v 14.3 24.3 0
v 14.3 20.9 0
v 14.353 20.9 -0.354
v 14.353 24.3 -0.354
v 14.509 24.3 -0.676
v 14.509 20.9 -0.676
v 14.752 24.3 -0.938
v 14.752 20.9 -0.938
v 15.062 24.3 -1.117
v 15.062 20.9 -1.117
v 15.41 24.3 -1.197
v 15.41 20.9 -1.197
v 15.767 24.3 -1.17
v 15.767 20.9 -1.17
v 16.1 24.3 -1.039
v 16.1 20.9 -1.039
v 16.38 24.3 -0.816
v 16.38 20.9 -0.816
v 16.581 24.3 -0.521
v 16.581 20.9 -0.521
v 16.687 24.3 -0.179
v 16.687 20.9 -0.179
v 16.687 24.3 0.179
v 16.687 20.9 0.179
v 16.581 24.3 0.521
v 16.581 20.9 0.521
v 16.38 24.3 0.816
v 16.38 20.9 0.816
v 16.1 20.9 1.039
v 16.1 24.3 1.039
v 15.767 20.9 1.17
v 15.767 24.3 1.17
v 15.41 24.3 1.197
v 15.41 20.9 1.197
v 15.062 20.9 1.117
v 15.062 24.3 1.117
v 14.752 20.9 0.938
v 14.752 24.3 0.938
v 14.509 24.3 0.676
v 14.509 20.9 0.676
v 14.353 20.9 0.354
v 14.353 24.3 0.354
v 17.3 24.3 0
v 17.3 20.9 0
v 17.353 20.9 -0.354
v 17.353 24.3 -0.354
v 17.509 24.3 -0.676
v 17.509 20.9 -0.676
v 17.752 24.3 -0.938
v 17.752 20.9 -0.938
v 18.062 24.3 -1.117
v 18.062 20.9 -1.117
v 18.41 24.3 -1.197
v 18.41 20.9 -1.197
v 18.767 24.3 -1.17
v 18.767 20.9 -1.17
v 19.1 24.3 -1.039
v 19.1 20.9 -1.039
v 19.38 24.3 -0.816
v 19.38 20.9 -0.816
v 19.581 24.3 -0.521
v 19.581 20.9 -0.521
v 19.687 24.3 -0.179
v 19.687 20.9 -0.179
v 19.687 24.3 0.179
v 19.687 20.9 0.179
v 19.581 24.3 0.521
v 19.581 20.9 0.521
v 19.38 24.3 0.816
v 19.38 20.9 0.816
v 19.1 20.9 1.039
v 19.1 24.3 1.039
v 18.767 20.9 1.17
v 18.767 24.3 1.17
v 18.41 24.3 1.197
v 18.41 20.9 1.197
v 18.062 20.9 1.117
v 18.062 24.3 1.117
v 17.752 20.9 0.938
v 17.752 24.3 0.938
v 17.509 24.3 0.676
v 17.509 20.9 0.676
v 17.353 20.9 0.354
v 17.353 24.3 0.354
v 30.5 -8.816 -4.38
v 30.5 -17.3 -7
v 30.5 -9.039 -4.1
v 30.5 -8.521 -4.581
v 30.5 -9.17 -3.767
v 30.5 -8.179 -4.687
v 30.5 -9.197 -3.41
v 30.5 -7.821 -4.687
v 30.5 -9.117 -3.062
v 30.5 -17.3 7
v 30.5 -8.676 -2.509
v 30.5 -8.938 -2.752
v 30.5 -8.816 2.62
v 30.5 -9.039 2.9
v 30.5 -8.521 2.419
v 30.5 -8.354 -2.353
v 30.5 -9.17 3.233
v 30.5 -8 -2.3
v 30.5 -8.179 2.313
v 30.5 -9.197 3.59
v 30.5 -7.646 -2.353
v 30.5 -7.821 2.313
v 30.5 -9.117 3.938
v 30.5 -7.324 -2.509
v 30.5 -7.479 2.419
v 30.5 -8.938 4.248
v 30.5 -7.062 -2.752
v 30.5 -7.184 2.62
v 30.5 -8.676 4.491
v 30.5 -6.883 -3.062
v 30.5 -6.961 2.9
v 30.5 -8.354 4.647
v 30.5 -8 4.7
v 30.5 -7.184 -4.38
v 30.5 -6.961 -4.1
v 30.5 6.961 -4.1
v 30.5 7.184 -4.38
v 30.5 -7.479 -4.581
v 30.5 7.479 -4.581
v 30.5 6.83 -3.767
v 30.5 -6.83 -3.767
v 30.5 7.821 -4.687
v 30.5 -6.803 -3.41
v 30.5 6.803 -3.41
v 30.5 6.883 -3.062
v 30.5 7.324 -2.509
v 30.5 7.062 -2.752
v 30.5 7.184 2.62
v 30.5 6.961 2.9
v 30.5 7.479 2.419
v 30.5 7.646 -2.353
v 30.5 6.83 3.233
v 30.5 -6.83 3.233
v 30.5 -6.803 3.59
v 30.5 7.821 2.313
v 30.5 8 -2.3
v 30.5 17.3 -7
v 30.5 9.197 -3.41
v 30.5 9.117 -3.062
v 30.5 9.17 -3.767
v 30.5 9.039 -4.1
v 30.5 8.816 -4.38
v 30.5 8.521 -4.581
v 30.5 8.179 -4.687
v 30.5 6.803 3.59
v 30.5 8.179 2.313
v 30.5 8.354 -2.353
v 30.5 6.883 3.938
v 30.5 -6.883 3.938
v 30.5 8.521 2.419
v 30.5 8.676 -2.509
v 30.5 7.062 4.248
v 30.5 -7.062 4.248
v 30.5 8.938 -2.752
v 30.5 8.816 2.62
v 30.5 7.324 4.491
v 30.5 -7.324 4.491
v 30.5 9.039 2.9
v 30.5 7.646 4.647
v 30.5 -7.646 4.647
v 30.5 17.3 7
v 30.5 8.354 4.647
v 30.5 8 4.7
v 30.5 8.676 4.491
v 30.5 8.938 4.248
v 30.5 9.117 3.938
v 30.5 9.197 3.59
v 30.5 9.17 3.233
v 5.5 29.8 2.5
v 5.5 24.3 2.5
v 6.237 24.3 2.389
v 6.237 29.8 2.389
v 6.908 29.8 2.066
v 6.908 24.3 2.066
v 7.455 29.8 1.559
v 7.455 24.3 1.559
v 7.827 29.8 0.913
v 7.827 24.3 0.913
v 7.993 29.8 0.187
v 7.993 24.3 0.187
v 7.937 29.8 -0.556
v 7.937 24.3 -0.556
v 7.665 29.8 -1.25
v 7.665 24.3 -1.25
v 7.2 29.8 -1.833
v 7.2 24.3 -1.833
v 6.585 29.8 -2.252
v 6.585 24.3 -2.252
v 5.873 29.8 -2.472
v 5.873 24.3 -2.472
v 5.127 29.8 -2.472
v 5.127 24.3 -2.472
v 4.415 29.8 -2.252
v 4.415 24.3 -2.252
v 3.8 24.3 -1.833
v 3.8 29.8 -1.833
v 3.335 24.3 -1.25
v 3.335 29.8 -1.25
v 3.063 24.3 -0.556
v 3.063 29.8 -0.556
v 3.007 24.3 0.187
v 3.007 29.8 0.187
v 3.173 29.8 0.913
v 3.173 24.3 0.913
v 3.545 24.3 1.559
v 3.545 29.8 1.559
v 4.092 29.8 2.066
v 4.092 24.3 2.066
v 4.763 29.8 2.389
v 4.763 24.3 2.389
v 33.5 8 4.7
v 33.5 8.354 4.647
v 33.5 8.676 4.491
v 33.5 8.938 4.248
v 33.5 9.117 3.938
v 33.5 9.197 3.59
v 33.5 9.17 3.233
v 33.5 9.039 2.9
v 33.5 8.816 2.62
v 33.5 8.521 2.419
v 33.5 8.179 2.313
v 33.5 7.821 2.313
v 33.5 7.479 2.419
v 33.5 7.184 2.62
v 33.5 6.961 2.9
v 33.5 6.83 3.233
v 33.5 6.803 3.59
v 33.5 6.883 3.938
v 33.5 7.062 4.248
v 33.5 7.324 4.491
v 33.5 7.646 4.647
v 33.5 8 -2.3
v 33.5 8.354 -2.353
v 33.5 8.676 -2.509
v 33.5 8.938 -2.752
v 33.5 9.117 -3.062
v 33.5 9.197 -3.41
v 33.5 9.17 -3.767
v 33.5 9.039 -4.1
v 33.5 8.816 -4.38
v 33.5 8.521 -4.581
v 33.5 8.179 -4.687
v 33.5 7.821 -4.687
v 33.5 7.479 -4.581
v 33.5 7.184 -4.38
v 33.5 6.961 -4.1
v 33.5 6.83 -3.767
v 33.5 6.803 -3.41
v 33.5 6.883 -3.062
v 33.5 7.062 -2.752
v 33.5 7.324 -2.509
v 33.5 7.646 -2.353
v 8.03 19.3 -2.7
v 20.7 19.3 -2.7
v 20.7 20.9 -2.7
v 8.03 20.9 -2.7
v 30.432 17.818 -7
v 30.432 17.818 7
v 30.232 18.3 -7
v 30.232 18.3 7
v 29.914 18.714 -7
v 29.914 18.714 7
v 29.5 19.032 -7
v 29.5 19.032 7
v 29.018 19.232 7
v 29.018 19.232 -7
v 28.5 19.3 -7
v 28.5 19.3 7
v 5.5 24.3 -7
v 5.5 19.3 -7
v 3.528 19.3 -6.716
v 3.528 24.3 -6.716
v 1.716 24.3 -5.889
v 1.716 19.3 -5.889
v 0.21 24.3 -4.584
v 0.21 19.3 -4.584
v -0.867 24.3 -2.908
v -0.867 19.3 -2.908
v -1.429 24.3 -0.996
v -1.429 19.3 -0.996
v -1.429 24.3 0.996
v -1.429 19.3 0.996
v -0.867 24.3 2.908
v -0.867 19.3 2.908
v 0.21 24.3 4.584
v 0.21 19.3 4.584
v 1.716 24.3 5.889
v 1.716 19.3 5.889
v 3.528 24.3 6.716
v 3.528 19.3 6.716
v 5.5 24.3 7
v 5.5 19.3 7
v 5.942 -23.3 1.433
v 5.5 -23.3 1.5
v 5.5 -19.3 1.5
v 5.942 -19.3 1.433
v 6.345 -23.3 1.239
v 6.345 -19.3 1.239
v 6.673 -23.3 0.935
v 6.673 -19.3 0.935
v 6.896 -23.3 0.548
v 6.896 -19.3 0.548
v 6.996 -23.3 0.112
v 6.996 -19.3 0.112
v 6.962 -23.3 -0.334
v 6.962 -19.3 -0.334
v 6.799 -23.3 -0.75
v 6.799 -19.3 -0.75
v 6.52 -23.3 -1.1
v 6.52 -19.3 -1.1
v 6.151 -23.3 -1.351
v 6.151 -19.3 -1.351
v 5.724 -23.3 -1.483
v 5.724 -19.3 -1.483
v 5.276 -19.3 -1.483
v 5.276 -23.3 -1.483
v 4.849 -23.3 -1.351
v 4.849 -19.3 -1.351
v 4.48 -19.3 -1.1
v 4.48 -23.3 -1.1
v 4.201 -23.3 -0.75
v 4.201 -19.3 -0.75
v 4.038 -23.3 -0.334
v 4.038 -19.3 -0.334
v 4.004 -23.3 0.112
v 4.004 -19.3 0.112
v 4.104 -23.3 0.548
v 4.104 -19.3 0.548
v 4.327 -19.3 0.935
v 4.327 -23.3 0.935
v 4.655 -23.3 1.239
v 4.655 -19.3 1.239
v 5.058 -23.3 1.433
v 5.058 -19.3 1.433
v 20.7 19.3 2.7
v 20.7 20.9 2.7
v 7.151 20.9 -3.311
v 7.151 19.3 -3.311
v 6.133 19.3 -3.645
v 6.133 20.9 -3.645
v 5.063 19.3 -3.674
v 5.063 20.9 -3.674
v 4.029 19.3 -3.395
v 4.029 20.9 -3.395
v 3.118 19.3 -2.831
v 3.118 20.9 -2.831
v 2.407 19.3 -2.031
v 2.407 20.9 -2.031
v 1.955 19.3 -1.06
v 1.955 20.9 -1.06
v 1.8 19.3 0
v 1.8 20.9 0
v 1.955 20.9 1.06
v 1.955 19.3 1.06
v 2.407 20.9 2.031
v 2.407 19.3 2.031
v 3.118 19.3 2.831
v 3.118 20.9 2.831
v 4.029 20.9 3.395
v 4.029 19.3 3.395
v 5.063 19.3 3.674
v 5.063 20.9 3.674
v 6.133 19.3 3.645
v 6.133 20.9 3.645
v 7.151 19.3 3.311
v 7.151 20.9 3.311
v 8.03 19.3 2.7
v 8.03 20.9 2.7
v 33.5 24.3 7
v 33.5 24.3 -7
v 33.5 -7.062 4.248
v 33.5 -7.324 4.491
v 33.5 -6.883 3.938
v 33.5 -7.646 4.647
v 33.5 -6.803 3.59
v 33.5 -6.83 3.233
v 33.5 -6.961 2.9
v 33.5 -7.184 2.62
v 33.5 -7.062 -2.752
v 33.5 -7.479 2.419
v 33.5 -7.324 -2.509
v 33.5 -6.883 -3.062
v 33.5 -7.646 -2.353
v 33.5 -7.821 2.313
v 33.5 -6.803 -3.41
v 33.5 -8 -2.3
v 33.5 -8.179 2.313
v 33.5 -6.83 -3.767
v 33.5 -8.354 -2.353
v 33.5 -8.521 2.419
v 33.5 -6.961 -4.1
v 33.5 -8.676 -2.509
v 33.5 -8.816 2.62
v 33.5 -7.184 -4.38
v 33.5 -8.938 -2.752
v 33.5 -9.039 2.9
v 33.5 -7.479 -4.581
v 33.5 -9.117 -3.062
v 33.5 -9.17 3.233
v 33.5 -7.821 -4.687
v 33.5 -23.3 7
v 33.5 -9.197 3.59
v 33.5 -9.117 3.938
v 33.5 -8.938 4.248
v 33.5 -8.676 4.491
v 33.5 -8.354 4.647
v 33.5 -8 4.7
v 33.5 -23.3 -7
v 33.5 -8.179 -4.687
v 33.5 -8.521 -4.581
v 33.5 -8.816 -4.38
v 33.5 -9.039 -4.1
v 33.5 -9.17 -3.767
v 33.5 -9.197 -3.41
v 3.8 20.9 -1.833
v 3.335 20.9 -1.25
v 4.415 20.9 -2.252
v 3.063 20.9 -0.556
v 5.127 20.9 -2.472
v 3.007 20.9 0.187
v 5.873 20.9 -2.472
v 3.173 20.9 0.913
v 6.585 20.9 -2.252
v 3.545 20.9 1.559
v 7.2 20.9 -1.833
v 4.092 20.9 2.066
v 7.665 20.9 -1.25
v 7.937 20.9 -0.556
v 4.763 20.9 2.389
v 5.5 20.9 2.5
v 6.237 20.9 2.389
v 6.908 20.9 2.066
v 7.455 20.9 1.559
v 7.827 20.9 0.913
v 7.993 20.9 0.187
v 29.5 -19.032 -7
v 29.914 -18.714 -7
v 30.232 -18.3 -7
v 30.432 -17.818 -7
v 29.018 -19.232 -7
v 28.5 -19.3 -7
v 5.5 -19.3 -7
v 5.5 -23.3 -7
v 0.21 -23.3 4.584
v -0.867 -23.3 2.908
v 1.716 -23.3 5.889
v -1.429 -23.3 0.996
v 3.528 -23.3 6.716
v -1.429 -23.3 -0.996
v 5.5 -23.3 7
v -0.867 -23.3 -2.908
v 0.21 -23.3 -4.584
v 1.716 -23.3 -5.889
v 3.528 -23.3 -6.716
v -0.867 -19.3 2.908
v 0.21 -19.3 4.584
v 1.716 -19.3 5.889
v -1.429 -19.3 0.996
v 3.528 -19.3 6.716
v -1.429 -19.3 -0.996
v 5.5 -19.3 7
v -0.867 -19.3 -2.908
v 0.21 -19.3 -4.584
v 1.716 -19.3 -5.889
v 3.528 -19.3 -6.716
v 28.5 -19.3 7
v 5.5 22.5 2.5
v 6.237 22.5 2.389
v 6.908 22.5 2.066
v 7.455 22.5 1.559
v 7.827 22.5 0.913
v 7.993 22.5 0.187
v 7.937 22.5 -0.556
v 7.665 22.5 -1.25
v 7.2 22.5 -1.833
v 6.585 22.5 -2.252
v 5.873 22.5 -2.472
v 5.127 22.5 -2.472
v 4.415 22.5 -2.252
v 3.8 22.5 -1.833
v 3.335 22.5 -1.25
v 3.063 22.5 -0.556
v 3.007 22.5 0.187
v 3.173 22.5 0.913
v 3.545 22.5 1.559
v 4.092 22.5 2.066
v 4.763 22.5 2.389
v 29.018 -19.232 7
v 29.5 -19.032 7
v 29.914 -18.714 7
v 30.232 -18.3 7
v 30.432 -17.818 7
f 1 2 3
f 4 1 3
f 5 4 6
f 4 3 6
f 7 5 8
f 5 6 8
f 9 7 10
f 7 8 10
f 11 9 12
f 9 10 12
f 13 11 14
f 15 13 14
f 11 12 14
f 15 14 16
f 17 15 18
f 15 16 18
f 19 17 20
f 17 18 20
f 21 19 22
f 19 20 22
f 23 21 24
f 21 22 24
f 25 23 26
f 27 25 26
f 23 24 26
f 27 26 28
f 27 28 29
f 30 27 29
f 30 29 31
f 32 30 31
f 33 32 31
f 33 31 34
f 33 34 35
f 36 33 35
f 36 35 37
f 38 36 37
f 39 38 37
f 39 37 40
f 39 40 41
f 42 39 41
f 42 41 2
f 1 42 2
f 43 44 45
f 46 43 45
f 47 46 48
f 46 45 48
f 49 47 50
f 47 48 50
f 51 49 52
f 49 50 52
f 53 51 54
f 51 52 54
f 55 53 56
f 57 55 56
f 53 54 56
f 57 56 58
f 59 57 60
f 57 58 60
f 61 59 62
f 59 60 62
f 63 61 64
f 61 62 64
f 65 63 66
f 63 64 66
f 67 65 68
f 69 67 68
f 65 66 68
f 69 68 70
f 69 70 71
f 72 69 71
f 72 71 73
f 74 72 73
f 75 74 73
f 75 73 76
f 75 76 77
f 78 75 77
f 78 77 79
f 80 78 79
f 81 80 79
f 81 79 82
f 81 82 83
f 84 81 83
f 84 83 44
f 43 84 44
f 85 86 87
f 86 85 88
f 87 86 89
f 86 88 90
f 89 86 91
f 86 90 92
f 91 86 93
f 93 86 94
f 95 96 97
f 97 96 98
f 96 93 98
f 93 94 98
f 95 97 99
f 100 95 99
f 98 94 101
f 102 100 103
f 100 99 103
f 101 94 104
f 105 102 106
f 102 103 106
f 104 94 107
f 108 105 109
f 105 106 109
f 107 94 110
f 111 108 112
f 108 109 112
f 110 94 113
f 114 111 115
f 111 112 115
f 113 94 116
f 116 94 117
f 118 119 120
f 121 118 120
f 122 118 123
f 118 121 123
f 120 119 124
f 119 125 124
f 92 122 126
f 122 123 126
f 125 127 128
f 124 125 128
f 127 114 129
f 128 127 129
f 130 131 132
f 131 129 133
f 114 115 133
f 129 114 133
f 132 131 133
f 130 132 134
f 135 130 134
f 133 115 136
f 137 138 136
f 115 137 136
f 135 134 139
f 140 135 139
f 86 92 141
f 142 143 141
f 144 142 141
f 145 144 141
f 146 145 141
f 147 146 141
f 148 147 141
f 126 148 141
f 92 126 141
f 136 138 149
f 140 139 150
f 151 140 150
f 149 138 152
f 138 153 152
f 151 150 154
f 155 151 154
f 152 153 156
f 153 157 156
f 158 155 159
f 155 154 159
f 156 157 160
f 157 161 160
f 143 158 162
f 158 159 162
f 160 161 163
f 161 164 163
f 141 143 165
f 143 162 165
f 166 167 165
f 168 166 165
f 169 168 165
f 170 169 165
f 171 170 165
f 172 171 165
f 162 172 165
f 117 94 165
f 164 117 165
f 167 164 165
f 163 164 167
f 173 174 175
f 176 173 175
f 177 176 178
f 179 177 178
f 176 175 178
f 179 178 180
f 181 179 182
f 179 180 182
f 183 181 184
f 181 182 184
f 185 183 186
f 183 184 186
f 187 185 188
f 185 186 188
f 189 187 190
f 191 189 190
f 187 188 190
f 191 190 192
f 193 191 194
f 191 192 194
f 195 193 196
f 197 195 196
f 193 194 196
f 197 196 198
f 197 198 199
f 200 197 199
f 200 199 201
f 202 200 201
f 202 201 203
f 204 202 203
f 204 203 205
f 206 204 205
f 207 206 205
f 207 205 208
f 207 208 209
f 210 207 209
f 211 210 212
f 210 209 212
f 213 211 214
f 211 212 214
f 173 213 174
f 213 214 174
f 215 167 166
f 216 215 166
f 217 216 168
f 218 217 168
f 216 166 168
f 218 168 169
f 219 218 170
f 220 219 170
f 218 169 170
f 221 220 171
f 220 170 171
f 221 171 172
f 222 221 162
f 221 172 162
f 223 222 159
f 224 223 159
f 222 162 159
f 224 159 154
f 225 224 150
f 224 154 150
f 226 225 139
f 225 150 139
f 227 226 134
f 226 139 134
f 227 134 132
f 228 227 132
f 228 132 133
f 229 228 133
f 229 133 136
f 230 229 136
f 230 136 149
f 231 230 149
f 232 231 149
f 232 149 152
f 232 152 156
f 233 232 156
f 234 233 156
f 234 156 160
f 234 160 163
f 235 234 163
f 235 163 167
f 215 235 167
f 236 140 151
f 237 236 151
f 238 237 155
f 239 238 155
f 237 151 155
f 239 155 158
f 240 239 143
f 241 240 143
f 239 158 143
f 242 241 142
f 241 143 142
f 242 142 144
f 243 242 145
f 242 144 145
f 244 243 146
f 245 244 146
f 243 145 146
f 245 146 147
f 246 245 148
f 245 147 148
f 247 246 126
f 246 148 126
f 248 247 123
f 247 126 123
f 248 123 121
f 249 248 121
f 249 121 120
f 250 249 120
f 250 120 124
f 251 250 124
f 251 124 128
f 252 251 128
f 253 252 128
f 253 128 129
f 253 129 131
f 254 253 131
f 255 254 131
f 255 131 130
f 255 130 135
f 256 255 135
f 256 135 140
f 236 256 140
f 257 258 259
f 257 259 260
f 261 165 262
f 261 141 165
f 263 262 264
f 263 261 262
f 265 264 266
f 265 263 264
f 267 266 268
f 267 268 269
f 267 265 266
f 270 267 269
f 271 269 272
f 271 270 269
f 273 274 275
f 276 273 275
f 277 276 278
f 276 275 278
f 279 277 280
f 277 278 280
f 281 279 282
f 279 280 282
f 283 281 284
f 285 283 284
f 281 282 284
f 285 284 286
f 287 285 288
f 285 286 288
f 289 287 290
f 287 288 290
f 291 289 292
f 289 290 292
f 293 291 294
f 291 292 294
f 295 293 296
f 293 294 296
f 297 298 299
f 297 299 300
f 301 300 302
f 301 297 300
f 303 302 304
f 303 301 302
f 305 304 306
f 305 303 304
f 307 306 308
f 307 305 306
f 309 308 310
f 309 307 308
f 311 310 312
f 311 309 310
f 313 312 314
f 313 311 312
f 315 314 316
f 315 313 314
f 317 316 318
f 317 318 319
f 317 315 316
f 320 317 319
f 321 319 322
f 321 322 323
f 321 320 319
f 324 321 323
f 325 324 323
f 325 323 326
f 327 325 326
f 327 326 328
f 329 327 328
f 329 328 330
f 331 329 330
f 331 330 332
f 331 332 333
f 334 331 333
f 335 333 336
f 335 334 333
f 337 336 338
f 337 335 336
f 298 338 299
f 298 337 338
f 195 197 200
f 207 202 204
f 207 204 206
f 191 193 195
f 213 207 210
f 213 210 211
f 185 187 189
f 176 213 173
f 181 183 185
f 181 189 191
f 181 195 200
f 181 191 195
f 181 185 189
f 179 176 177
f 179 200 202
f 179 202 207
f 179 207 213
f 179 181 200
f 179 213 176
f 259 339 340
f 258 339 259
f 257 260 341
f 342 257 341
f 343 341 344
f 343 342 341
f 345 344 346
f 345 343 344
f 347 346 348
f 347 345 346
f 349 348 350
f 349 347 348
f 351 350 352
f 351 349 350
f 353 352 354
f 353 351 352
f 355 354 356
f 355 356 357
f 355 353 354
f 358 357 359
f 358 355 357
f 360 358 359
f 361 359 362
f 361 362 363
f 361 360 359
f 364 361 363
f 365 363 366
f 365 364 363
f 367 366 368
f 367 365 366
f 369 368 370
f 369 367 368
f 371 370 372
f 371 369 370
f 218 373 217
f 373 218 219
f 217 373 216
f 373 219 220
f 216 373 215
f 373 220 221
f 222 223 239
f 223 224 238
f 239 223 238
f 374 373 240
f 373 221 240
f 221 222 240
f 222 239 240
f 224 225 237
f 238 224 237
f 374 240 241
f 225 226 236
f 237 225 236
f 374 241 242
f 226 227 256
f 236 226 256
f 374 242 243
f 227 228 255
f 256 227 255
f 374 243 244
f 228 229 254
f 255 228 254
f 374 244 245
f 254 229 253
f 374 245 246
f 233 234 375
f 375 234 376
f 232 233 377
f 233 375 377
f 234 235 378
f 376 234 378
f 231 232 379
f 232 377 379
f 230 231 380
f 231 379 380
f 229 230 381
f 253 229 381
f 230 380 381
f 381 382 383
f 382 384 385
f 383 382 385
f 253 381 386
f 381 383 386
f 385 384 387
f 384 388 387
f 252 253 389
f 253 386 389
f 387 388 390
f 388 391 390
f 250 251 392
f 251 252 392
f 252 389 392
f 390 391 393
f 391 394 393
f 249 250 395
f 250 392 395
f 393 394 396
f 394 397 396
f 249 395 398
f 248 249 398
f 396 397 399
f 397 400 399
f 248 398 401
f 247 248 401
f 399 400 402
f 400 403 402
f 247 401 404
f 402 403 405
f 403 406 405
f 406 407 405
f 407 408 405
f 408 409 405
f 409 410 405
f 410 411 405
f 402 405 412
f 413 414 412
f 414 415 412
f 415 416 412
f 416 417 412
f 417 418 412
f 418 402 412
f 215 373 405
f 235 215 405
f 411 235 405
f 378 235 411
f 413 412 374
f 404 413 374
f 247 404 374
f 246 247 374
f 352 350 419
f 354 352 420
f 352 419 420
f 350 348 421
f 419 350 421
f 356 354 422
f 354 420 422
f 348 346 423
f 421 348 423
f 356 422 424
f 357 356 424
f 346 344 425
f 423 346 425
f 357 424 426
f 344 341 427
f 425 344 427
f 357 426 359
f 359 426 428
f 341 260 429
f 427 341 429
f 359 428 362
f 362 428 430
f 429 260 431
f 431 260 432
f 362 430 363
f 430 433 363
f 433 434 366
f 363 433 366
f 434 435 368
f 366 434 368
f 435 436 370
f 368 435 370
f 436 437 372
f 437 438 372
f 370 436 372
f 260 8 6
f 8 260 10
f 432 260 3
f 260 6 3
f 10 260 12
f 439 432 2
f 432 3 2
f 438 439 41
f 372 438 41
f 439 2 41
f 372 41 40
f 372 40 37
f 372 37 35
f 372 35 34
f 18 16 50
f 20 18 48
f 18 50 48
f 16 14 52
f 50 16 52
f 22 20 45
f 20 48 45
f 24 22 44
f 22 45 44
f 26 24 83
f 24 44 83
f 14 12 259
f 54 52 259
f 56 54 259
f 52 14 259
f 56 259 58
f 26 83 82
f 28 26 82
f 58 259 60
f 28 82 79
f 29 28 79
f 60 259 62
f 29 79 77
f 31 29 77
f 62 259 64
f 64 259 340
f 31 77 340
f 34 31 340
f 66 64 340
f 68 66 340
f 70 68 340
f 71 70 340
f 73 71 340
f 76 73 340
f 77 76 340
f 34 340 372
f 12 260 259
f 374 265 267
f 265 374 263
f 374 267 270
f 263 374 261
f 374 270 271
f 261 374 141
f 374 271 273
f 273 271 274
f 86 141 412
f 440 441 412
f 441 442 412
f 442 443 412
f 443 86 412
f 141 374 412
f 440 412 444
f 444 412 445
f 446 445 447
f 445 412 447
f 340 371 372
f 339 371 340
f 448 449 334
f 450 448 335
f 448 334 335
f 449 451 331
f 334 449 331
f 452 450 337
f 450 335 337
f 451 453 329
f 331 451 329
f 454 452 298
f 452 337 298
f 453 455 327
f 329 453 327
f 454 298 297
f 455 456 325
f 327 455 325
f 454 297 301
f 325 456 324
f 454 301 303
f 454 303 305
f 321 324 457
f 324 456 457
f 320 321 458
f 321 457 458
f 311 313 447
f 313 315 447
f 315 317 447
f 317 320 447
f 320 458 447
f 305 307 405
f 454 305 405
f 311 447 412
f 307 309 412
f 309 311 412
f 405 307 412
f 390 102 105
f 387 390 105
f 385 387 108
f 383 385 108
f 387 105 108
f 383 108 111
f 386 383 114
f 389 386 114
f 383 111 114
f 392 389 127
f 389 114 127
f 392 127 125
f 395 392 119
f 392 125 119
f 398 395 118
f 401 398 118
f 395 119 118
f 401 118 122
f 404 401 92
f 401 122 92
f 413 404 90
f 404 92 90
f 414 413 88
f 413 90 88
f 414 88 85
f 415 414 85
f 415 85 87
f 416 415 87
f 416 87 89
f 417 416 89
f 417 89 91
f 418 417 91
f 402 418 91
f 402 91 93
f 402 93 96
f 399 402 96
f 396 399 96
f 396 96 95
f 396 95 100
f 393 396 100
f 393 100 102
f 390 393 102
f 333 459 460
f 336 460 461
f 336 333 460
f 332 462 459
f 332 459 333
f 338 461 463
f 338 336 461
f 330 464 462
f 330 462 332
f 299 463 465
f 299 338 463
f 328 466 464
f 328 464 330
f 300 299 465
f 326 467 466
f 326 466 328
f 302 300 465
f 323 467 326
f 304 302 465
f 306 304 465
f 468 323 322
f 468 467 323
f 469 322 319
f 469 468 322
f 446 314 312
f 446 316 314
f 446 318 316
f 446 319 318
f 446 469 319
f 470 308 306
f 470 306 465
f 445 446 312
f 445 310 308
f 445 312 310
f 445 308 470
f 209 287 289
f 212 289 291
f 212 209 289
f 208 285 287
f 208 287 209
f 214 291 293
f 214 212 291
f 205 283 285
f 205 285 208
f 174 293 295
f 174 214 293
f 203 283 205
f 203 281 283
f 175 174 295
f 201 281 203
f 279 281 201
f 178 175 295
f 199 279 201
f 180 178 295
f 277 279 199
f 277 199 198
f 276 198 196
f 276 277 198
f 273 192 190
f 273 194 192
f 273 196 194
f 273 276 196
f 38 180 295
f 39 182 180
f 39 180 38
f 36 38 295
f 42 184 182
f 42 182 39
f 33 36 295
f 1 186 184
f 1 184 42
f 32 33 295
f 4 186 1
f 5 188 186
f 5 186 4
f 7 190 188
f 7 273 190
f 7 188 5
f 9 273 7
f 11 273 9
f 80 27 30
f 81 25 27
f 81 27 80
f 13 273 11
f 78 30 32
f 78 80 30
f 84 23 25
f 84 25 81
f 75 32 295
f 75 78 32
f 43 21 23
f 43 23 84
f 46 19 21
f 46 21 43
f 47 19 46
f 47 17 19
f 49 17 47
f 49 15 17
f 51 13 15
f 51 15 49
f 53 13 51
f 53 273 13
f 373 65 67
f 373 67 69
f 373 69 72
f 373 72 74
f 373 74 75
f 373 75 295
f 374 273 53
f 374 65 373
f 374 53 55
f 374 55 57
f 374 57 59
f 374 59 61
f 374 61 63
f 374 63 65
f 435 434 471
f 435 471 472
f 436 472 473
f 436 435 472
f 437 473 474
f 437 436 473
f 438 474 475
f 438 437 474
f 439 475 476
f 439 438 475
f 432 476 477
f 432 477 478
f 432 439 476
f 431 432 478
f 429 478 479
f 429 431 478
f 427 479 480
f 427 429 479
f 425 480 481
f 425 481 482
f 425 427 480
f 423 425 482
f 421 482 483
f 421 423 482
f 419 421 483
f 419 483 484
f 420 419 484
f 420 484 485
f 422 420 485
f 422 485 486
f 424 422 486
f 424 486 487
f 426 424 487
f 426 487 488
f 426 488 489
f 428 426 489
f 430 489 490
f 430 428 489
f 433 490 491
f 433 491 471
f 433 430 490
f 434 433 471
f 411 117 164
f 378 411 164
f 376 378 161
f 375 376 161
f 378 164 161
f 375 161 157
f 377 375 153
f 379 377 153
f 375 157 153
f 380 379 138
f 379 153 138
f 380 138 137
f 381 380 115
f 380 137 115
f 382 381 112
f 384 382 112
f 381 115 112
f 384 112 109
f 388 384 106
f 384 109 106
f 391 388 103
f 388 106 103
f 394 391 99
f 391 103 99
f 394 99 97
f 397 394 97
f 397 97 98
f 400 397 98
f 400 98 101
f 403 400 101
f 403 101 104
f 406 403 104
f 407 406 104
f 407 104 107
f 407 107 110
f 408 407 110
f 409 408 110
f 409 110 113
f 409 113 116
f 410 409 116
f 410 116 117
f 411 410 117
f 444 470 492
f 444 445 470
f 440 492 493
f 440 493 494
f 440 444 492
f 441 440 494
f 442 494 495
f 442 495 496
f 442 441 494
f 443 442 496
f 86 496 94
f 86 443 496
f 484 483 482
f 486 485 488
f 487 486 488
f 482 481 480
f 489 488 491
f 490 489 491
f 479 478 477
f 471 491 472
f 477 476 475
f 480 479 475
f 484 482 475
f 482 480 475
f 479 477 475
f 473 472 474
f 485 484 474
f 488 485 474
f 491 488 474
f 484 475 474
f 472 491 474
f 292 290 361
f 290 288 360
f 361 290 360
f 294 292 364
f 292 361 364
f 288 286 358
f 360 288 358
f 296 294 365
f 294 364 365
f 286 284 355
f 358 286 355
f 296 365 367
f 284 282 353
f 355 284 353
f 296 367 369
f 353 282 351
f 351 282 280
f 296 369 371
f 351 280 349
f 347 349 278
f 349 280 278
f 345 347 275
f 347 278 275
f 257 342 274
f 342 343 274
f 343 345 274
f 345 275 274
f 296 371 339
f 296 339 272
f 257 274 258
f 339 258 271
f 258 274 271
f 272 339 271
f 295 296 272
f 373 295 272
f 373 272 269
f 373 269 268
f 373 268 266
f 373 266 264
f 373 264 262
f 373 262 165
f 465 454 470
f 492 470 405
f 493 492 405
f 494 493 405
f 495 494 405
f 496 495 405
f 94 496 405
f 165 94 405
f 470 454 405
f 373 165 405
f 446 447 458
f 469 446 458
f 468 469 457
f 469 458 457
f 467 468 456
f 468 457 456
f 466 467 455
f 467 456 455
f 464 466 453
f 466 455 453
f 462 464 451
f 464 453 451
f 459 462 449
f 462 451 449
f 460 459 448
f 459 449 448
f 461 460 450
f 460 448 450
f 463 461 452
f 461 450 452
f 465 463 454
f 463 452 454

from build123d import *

# Parameters (mm, degrees)
BOSS_EXTRUDE1_DEPTH      = 5
BOSS_EXTRUDE2_DEPTH      = 4
SKETCH3_W                = 3
SKETCH3_H                = 47.6
BOSS_EXTRUDE3_DEPTH      = 7
SKETCH4_R                = 2.5
BOSS_EXTRUDE4_DEPTH      = 5.5
SKETCH5_R                = 3.7
CUT_EXTRUDE2_DEPTH       = 1.6
CUT_EXTRUDE4_DEPTH       = 1.6
SKETCH7_R                = 2.5
CUT_EXTRUDE6_DEPTH       = 1.6
SKETCH8_R                = 1.5
CUT_EXTRUDE8_DEPTH       = 4
M2_CLEARANCE_HOLE1_D     = 2.4
M2_CLEARANCE_HOLE1_DEPTH = 5
M2_CLEARANCE_HOLE1_TIP   = 0.721032743
M2_CLEARANCE_HOLE2_D     = 2.4
M2_CLEARANCE_HOLE2_DEPTH = 5
M2_CLEARANCE_HOLE2_TIP   = 0.721032743
M2_CLEARANCE_HOLE3_D     = 2.4
M2_CLEARANCE_HOLE3_DEPTH = 35
M2_CLEARANCE_HOLE4_D     = 2.4
M2_CLEARANCE_HOLE4_DEPTH = 35
M2_CLEARANCE_HOLE5_D     = 2.4
M2_CLEARANCE_HOLE5_DEPTH = 35
M2_CLEARANCE_HOLE6_D     = 2.4
M2_CLEARANCE_HOLE6_DEPTH = 35
FILLET1_R                = 2


with BuildPart() as part:
    # Sketch1 → Boss-Extrude1 (new body)
    with BuildSketch(Plane(origin=(0, 19.3, 0), x_dir=(1, 0, 0), z_dir=(0, 1, 0))):
        with BuildLine():
            Line((5.5, -7), (33.5, -7))
            Line((33.5, -7), (33.5, 7))
            Line((33.5, 7), (5.5, 7))
            ThreePointArc((5.5, 7), (-1.5, 0), (5.5, -7))
        make_face()
    extrude(amount=BOSS_EXTRUDE1_DEPTH)



with BuildPart() as body_2:
    # Sketch2 → Boss-Extrude2 (new body)
    with BuildSketch(Plane(origin=(0, -23.3, 0), x_dir=(1, 0, 0), z_dir=(0, 1, 0))):
        with BuildLine():
            Line((5.5, -7), (33.5, -7))
            Line((33.5, -7), (33.5, 7))
            Line((33.5, 7), (5.5, 7))
            ThreePointArc((5.5, 7), (-1.5, 0), (5.5, -7))
        make_face()
    extrude(amount=BOSS_EXTRUDE2_DEPTH)


with BuildPart() as part_1:
    add(part.part)

    add(body_2.part)  # Boss-Extrude3 merges body 2
    # Sketch3 → Boss-Extrude3 (add, symmetric)
    with BuildSketch(Plane.XY):
        with Locations((32, 0.5)):
            Rectangle(SKETCH3_W, SKETCH3_H)
    extrude(amount=BOSS_EXTRUDE3_DEPTH, both=True)

    # Sketch4 → Boss-Extrude4 (add)
    with BuildSketch(Plane(origin=(0, 24.3, 0), x_dir=(1, 0, 0), z_dir=(0, 1, 0))):
        with Locations(Location((5.5, 0, 0), (0, 0, 270))):
            Circle(SKETCH4_R)
    extrude(amount=BOSS_EXTRUDE4_DEPTH)

    # Sketch5 → Cut-Extrude2 (cut)
    with BuildSketch(Plane(origin=(0, 19.3, 0), x_dir=(1, 0, 0), z_dir=(0, 1, 0))):
        with Locations(Location((5.5, 0, 0), (0, 0, 270))):
            Circle(SKETCH5_R)
    extrude(amount=CUT_EXTRUDE2_DEPTH, mode=Mode.SUBTRACT)

    # Sketch6 → Cut-Extrude4 (cut)
    with BuildSketch(Plane(origin=(0, 19.3, 0), x_dir=(1, 0, 0), z_dir=(0, 1, 0))):
        with BuildLine():
            Line((5.5, -2.7), (20.7, -2.7))
            Line((20.7, -2.7), (20.7, 2.7))
            Line((20.7, 2.7), (5.5, 2.7))
            ThreePointArc((5.5, 2.7), (2.8, 0), (5.5, -2.7))
        make_face()
    extrude(amount=CUT_EXTRUDE4_DEPTH, mode=Mode.SUBTRACT)

    # Sketch7 → Cut-Extrude6 (cut)
    with BuildSketch(Plane(origin=(0, 20.9, 0), x_dir=(1, 0, 0), z_dir=(0, 1, 0))):
        with Locations(Location((5.5, 0, 0), (0, 0, 270))):
            Circle(SKETCH7_R)
    extrude(amount=CUT_EXTRUDE6_DEPTH, mode=Mode.SUBTRACT)

    # Sketch8 → Cut-Extrude8 (cut)
    with BuildSketch(Plane(origin=(0, -23.3, 0), x_dir=(1, 0, 0), z_dir=(0, 1, 0))):
        with Locations(Location((5.5, 0, 0), (0, 0, 270))):
            Circle(SKETCH8_R)
    extrude(amount=CUT_EXTRUDE8_DEPTH, mode=Mode.SUBTRACT)

    # M2 Clearance Hole1
    with Locations(Plane(origin=(0, 24.3, 0), x_dir=(1, 0, 0), z_dir=(0, 1, 0))):
        with Locations((15.5, 0)):
            Hole(M2_CLEARANCE_HOLE1_D / 2, depth=M2_CLEARANCE_HOLE1_DEPTH)
            with Locations((0, 0, -(M2_CLEARANCE_HOLE1_DEPTH + M2_CLEARANCE_HOLE1_TIP / 2))):  # 118° drill point
                Cone(0, M2_CLEARANCE_HOLE1_D / 2, M2_CLEARANCE_HOLE1_TIP, mode=Mode.SUBTRACT)

    # M2 Clearance Hole2
    with Locations(Plane(origin=(0, 24.3, 0), x_dir=(1, 0, 0), z_dir=(0, 1, 0))):
        with Locations((18.5, 0)):
            Hole(M2_CLEARANCE_HOLE2_D / 2, depth=M2_CLEARANCE_HOLE2_DEPTH)
            with Locations((0, 0, -(M2_CLEARANCE_HOLE2_DEPTH + M2_CLEARANCE_HOLE2_TIP / 2))):  # 118° drill point
                Cone(0, M2_CLEARANCE_HOLE2_D / 2, M2_CLEARANCE_HOLE2_TIP, mode=Mode.SUBTRACT)

    # M2 Clearance Hole3
    with Locations(Plane(origin=(33.5, 0, 0), x_dir=(0, 0, -1), z_dir=(1, 0, 0))):
        with Locations((3.5, -8)):
            Hole(M2_CLEARANCE_HOLE3_D / 2, depth=M2_CLEARANCE_HOLE3_DEPTH)

    # M2 Clearance Hole4
    with Locations(Plane(origin=(33.5, 0, 0), x_dir=(0, 0, -1), z_dir=(1, 0, 0))):
        with Locations((-3.5, -8)):
            Hole(M2_CLEARANCE_HOLE4_D / 2, depth=M2_CLEARANCE_HOLE4_DEPTH)

    # M2 Clearance Hole5
    with Locations(Plane(origin=(33.5, 0, 0), x_dir=(0, 0, -1), z_dir=(1, 0, 0))):
        with Locations((3.5, 8)):
            Hole(M2_CLEARANCE_HOLE5_D / 2, depth=M2_CLEARANCE_HOLE5_DEPTH)

    # M2 Clearance Hole6
    with Locations(Plane(origin=(33.5, 0, 0), x_dir=(0, 0, -1), z_dir=(1, 0, 0))):
        with Locations((-3.5, 8)):
            Hole(M2_CLEARANCE_HOLE6_D / 2, depth=M2_CLEARANCE_HOLE6_DEPTH)

    # Fillet1
    fillet1_edges = [part_1.edges().sort_by_distance(p)[0] for p in [
        (30.5, 19.3, 0),
        (30.5, -19.3, 0),
    ]]
    fillet(fillet1_edges, radius=FILLET1_R)


solid = part_1.part
